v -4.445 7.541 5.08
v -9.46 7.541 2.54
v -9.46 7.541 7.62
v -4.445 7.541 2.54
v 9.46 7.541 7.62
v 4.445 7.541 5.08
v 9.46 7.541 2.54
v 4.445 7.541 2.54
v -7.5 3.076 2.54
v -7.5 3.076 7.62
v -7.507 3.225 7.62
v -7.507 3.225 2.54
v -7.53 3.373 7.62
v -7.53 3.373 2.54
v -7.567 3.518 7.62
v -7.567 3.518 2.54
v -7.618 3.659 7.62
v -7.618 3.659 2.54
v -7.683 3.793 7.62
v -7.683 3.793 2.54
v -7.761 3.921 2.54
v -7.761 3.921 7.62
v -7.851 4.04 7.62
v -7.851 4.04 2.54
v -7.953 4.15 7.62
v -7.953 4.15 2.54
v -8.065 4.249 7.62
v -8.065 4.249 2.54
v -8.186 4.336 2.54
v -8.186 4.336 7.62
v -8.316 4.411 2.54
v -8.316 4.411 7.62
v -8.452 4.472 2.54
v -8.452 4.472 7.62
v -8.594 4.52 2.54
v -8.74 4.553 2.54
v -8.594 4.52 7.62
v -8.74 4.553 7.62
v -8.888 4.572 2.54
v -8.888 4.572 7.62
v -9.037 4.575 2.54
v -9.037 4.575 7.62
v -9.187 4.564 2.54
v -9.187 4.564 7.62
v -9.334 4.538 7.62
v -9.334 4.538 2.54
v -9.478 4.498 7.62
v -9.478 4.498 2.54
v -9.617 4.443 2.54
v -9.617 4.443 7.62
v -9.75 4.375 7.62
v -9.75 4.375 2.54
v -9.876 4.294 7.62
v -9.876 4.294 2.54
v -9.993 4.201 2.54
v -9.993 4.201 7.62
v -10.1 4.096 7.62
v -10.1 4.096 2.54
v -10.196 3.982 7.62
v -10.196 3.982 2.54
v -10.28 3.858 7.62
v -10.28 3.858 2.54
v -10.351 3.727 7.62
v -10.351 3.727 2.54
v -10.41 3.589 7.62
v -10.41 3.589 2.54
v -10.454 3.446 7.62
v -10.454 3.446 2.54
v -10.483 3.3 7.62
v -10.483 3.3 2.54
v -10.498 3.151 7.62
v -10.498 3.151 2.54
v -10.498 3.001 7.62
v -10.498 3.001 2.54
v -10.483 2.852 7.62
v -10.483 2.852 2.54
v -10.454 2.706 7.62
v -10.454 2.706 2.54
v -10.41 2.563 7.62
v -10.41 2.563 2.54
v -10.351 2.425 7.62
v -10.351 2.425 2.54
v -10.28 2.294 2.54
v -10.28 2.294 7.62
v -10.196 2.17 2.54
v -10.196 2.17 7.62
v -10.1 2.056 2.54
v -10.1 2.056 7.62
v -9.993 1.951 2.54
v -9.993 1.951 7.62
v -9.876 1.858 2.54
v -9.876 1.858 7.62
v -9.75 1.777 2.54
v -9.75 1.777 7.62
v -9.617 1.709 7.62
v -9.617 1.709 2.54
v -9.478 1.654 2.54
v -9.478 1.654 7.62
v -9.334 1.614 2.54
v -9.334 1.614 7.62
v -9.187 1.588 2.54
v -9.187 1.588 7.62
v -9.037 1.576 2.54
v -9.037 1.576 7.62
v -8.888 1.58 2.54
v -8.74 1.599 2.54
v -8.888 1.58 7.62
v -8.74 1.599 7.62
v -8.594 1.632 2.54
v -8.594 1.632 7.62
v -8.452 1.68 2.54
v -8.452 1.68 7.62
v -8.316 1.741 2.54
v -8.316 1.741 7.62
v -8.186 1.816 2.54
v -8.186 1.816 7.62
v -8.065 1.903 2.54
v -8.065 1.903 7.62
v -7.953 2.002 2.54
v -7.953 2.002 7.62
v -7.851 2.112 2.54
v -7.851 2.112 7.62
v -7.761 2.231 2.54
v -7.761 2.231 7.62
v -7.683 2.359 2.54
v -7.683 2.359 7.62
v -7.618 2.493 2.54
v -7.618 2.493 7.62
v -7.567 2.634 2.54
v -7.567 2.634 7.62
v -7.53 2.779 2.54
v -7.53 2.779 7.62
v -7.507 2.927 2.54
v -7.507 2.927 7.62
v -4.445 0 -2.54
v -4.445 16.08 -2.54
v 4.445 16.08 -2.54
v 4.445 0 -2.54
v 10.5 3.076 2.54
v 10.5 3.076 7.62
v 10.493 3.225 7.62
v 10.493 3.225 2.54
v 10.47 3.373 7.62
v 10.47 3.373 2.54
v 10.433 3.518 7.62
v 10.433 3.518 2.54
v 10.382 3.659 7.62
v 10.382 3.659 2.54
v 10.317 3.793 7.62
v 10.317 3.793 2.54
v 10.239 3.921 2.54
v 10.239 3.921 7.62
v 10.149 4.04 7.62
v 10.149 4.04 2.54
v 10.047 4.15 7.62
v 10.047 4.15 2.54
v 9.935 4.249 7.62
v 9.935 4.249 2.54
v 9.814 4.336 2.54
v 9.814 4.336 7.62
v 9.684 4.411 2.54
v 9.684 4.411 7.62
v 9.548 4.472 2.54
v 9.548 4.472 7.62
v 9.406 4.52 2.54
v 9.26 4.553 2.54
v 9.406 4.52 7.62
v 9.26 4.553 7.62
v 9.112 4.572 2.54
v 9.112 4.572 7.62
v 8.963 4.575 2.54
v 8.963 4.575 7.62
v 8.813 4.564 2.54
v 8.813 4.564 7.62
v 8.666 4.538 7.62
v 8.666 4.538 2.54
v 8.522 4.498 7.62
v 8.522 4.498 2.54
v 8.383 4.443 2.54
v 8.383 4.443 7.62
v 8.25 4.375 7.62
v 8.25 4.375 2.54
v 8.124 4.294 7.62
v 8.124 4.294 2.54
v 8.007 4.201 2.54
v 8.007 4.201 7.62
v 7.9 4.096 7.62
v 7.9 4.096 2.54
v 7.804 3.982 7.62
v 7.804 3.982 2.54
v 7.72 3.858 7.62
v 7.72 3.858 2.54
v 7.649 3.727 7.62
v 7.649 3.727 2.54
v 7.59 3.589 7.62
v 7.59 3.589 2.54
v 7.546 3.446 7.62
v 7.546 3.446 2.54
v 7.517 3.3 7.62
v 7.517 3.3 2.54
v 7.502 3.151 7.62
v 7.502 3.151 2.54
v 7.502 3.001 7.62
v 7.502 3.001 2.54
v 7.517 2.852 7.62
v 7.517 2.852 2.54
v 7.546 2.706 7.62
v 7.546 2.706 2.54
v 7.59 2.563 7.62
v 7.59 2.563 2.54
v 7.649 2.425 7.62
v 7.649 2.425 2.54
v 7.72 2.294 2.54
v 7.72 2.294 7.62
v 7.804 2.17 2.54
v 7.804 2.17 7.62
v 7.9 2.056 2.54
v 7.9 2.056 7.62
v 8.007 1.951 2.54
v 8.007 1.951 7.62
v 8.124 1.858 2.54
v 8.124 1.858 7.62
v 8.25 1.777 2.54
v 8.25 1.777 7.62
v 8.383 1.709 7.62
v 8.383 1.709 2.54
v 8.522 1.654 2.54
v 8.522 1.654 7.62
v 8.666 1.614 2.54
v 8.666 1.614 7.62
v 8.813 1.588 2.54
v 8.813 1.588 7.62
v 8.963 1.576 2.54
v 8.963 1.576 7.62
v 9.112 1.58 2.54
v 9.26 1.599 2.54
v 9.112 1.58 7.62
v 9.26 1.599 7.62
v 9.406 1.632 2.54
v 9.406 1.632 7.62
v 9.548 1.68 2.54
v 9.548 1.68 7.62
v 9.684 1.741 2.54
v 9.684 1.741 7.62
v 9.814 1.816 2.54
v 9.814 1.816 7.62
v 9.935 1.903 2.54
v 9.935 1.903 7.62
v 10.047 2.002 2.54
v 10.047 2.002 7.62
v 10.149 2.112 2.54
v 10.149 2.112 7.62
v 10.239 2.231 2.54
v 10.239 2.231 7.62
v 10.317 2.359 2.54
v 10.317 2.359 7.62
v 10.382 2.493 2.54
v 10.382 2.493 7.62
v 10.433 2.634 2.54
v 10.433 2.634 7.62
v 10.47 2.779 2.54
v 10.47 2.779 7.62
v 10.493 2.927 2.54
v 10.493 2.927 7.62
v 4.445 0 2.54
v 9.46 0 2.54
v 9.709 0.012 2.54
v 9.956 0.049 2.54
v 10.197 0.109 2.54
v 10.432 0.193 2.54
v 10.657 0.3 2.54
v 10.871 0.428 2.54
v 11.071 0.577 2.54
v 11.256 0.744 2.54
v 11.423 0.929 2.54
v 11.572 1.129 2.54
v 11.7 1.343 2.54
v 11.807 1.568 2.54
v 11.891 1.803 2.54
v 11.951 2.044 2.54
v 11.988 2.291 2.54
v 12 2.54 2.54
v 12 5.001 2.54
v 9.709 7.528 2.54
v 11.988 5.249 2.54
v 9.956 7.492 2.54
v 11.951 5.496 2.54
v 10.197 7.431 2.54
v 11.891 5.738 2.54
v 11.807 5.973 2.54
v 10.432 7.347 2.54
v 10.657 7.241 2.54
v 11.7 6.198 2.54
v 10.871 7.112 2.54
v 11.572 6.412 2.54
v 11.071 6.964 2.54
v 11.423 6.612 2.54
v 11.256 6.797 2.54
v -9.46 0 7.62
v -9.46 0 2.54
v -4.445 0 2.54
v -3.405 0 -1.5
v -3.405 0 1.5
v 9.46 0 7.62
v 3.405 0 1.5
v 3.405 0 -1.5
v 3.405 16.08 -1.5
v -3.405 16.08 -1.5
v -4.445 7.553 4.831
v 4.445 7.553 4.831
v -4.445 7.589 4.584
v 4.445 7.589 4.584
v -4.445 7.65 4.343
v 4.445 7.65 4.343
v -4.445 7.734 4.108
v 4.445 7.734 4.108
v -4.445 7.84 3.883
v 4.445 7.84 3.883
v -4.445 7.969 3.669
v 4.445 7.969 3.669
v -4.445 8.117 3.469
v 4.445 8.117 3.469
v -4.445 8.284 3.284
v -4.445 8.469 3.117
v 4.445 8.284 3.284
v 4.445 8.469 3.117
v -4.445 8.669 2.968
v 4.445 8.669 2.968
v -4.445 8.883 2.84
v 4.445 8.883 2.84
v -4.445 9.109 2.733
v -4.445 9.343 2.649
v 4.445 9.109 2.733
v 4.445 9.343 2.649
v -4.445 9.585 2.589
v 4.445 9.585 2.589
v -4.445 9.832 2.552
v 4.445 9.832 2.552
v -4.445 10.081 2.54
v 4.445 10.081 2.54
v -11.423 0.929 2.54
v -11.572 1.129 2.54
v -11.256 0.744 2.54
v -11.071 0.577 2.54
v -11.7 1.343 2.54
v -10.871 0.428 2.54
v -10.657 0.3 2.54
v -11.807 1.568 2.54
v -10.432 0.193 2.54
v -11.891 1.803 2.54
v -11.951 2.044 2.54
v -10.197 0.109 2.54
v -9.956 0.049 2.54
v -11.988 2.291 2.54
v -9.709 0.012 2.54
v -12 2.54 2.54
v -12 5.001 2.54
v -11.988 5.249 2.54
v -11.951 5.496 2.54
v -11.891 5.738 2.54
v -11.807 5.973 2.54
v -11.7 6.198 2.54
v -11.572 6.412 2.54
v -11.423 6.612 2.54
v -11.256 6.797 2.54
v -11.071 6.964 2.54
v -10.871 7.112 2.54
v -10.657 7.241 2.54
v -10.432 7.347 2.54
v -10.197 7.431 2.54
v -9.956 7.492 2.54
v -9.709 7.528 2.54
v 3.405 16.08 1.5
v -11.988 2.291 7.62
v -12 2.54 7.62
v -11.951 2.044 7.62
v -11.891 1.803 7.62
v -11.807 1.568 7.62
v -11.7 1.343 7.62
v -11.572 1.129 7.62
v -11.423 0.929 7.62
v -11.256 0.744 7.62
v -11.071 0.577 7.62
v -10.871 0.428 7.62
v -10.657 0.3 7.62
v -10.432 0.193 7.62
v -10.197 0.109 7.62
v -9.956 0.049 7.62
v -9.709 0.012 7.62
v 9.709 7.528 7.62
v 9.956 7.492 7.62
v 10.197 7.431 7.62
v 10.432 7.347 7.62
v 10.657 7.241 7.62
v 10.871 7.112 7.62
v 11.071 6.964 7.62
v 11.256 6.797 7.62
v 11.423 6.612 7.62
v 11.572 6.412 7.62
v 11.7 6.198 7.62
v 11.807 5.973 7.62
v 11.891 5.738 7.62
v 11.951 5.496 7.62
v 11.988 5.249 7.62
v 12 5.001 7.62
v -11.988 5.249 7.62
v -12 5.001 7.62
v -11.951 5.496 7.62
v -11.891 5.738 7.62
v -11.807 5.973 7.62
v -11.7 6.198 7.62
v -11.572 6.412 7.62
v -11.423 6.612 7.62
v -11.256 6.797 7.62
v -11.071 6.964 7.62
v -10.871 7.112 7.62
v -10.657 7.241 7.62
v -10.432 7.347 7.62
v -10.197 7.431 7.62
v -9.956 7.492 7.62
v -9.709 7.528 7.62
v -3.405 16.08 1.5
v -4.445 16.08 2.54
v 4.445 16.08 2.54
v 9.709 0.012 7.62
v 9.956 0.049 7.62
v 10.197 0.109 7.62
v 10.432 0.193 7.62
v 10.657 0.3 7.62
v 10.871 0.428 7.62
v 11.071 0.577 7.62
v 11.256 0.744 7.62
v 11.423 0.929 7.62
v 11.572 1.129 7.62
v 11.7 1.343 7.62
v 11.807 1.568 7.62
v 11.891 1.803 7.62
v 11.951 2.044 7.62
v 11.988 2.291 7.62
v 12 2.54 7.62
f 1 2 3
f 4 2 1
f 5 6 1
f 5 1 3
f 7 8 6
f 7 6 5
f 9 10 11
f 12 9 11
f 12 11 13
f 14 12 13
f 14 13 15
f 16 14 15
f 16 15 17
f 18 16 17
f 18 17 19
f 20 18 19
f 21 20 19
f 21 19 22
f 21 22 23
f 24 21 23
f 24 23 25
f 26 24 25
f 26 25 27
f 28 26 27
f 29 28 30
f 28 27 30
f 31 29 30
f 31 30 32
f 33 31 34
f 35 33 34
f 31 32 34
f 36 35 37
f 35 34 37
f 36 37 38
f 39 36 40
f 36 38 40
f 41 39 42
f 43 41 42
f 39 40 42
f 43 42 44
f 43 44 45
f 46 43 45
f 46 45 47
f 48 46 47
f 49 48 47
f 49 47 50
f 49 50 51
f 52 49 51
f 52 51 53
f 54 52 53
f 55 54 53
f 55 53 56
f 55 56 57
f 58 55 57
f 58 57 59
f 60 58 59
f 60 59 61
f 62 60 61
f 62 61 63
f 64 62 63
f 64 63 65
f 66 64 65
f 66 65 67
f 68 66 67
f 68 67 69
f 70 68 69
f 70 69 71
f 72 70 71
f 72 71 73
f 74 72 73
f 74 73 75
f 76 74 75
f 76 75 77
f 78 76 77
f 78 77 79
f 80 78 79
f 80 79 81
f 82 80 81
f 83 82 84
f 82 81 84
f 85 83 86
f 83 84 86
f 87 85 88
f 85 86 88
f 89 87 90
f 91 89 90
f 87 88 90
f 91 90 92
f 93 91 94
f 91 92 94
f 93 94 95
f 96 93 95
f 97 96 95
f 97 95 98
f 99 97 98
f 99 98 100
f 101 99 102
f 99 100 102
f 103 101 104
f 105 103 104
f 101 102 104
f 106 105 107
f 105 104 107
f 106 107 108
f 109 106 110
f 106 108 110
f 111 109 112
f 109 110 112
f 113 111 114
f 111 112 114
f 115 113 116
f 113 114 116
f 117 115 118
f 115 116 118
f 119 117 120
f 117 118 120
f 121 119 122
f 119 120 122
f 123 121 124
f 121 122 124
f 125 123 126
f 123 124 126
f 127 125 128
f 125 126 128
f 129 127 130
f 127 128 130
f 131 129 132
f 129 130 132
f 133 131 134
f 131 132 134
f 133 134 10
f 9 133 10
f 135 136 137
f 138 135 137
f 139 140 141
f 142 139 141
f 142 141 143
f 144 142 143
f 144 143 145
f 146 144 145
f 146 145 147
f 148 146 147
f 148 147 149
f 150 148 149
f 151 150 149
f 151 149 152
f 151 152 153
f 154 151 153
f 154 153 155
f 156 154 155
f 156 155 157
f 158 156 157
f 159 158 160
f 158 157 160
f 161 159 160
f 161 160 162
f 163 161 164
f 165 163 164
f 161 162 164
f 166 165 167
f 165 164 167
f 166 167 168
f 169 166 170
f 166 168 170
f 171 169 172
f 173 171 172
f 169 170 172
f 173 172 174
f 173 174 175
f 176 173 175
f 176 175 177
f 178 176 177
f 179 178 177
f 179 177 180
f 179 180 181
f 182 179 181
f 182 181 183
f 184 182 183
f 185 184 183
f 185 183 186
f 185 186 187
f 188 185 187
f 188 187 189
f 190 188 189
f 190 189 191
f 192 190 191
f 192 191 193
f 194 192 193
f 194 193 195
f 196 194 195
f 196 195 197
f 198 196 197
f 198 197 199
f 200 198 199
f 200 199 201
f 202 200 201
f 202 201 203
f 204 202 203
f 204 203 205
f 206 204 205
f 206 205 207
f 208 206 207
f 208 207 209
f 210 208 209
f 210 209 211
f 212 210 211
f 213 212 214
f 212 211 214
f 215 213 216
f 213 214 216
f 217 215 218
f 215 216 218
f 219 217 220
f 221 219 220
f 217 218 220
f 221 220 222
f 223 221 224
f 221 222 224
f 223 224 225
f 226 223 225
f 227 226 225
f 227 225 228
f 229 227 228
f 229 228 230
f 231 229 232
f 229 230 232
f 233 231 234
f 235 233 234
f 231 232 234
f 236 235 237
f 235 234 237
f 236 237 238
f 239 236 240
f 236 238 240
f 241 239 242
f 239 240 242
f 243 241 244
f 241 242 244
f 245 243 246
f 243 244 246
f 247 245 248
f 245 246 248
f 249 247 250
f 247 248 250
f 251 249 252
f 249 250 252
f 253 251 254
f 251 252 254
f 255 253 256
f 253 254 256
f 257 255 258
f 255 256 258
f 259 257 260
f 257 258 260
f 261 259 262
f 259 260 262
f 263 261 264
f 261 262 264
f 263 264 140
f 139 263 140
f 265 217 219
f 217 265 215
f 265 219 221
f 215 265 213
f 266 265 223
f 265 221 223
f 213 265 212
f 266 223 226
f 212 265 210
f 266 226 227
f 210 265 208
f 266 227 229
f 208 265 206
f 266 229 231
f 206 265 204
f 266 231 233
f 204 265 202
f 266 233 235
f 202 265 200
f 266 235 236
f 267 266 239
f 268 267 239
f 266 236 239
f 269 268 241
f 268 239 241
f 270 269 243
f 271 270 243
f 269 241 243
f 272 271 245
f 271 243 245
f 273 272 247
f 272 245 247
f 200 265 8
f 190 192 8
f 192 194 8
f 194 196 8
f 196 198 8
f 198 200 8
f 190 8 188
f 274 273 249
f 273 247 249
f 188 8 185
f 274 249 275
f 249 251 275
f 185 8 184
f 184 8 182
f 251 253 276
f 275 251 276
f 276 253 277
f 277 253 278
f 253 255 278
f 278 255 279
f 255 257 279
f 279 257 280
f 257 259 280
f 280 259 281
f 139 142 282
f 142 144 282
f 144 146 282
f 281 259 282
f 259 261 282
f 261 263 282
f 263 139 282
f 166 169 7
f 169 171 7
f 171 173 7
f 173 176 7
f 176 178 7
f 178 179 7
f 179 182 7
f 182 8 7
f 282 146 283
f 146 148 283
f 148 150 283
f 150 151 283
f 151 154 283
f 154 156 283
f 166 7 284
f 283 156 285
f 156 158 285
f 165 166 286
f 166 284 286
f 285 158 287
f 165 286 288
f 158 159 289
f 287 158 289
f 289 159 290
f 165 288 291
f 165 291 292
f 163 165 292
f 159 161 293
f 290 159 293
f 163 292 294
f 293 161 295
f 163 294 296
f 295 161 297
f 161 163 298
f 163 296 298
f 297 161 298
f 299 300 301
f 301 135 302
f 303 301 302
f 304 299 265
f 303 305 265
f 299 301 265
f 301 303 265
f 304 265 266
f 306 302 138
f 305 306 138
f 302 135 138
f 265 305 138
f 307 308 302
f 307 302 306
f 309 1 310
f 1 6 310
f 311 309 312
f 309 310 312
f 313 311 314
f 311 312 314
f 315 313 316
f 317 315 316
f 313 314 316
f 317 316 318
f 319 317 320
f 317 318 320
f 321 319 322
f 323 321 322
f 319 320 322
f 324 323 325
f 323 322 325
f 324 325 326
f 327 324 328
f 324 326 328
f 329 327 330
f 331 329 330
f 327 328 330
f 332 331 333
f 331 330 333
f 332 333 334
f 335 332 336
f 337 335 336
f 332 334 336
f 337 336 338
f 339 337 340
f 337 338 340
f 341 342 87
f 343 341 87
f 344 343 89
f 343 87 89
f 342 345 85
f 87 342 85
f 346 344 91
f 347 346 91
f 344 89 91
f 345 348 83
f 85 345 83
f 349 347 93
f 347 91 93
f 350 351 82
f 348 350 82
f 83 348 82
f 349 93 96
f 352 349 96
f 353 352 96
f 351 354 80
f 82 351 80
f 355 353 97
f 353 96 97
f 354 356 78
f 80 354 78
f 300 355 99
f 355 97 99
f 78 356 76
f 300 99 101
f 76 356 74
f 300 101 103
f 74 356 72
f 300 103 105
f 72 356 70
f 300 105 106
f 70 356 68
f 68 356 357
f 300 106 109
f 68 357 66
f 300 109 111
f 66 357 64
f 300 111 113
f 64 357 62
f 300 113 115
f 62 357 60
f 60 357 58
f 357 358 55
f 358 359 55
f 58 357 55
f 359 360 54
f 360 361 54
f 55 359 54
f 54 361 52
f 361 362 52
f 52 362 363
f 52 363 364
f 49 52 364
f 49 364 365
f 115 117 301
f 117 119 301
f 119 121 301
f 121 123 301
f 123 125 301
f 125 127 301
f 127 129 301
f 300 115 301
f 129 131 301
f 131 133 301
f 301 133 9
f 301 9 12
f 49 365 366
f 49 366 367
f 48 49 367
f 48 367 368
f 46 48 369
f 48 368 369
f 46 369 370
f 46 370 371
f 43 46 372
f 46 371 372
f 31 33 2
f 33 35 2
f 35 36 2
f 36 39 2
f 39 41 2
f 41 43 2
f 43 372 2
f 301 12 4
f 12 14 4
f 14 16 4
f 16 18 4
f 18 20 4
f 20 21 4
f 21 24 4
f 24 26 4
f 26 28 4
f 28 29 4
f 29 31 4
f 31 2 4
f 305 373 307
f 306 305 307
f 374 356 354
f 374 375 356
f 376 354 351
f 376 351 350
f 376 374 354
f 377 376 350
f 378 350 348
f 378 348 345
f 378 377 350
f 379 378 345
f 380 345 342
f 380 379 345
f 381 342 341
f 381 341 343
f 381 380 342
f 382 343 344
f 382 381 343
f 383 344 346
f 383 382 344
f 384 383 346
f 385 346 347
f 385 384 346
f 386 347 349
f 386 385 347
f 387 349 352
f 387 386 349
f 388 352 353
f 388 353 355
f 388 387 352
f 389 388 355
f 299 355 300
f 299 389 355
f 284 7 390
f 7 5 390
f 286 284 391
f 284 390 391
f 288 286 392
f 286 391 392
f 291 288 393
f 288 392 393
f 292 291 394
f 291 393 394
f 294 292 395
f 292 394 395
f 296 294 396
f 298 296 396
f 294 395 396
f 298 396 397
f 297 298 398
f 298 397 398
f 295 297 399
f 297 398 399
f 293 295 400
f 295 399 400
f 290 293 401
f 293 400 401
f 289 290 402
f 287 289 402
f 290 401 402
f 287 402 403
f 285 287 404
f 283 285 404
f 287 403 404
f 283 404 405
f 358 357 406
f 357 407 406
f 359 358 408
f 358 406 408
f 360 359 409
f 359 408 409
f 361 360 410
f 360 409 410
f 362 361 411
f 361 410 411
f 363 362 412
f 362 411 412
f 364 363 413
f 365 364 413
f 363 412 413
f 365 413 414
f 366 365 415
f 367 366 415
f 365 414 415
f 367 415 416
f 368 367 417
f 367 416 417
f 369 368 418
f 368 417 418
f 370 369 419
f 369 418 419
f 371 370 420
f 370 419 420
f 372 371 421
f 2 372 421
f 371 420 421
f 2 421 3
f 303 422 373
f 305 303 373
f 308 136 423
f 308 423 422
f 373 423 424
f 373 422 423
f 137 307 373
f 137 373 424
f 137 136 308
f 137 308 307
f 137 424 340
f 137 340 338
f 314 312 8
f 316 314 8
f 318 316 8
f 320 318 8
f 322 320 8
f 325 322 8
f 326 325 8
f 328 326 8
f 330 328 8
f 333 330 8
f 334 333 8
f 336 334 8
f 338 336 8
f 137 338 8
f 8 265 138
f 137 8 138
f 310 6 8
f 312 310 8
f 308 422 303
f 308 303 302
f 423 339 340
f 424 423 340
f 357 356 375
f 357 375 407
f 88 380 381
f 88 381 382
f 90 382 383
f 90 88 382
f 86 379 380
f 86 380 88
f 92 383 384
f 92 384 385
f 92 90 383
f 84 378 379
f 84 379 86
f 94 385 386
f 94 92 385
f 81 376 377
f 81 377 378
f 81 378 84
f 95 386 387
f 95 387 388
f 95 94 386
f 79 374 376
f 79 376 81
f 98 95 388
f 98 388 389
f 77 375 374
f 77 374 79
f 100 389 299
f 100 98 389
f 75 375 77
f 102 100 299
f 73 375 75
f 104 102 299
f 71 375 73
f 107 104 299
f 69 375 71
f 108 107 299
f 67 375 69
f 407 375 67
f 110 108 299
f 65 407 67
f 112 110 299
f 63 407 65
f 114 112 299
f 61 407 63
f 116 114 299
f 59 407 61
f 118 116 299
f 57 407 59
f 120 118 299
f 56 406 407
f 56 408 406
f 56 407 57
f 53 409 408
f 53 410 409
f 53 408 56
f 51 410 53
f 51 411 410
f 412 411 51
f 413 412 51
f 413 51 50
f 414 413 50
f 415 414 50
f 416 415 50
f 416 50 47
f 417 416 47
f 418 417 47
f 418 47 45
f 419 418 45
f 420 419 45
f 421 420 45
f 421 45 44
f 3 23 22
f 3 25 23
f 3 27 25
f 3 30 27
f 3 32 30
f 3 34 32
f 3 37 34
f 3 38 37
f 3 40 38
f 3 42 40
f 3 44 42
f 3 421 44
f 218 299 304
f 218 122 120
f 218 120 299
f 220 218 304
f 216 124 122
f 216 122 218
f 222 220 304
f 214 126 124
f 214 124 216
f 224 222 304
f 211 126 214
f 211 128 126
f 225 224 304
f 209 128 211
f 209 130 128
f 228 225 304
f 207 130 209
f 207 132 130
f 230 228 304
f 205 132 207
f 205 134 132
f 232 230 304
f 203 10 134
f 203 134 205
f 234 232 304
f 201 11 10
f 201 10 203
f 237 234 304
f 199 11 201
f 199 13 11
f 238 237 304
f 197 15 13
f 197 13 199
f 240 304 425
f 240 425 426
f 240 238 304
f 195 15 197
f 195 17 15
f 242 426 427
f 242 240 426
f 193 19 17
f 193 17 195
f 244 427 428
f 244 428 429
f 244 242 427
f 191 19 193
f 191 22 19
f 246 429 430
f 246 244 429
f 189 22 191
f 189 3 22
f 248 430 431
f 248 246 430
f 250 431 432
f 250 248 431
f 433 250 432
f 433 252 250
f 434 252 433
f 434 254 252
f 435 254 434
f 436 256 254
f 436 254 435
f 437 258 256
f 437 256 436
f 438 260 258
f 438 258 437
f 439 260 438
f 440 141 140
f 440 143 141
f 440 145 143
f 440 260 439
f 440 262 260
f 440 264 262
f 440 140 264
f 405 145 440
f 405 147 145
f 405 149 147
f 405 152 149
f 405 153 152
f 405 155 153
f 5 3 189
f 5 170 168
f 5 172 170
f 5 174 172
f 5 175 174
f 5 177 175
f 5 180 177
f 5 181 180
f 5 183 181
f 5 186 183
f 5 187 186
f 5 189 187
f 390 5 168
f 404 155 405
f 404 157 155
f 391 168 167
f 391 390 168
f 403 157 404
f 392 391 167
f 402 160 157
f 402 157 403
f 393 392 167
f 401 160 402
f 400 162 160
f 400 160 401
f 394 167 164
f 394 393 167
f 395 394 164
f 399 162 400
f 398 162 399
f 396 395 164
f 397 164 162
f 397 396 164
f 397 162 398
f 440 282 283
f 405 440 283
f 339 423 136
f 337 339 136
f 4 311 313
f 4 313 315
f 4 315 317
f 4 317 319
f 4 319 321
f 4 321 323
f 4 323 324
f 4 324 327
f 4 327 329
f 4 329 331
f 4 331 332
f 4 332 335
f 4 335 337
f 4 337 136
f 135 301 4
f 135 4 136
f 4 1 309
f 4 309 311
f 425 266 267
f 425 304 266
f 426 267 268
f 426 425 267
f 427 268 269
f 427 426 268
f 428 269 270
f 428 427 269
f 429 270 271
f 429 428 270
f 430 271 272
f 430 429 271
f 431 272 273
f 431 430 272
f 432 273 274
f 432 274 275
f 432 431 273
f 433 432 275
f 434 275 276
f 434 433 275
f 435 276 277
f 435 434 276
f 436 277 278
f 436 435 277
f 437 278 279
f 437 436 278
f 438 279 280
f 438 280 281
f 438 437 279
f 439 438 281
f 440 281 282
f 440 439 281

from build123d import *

# Parameters (mm, degrees)
SKETCH1_W           = 8.89
SKETCH1_H           = 5.08
BOSS_EXTRUDE1_DEPTH = 16.08
SKETCH2_W           = 24
SKETCH2_H           = 7.540516724
BOSS_EXTRUDE2_DEPTH = 5.08
SKETCH3_R           = 1.5
CUT_EXTRUDE1_DEPTH  = 11.16
SKETCH4_W           = 6.81
SKETCH4_H           = 3
CUT_EXTRUDE2_DEPTH  = 17.08
FILLET1_R           = 2.54


with BuildPart() as part:
    # Sketch1 → Boss-Extrude1 (new body)
    with BuildSketch(Plane(origin=(0, 0, 0), x_dir=(1, 0, 0), z_dir=(0, 1, 0))):
        Rectangle(SKETCH1_W, SKETCH1_H)
    extrude(amount=BOSS_EXTRUDE1_DEPTH)

    # Sketch2 → Boss-Extrude2 (add)
    with BuildSketch(Plane.XY.offset(2.54)):
        with Locations((0, 3.770258362)):
            Rectangle(SKETCH2_W, SKETCH2_H)
    extrude(amount=BOSS_EXTRUDE2_DEPTH)

    # Sketch3 → Cut-Extrude1 (cut, through all)
    with BuildSketch(Plane.XY.offset(7.62)):
        with Locations((-9, 3.07594)):
            Circle(SKETCH3_R)
        with Locations((9, 3.07594)):
            Circle(SKETCH3_R)
    extrude(amount=-CUT_EXTRUDE1_DEPTH, mode=Mode.SUBTRACT)

    # Sketch4 → Cut-Extrude2 (cut, through all)
    with BuildSketch(Plane(origin=(0, 16.08, 0), x_dir=(1, 0, 0), z_dir=(0, 1, 0))):
        Rectangle(SKETCH4_W, SKETCH4_H)
    extrude(amount=-CUT_EXTRUDE2_DEPTH, mode=Mode.SUBTRACT)

    # Fillet1
    fillet1_edges = [part.edges().sort_by_distance(p)[0] for p in [
        (12, 0, 5.08),
        (-12, 0, 5.08),
        (0, 7.540516724, 2.54),
        (12, 7.540516724, 5.08),
        (-12, 7.540516724, 5.08),
    ]]
    fillet(fillet1_edges, radius=FILLET1_R)


solid = part.part
